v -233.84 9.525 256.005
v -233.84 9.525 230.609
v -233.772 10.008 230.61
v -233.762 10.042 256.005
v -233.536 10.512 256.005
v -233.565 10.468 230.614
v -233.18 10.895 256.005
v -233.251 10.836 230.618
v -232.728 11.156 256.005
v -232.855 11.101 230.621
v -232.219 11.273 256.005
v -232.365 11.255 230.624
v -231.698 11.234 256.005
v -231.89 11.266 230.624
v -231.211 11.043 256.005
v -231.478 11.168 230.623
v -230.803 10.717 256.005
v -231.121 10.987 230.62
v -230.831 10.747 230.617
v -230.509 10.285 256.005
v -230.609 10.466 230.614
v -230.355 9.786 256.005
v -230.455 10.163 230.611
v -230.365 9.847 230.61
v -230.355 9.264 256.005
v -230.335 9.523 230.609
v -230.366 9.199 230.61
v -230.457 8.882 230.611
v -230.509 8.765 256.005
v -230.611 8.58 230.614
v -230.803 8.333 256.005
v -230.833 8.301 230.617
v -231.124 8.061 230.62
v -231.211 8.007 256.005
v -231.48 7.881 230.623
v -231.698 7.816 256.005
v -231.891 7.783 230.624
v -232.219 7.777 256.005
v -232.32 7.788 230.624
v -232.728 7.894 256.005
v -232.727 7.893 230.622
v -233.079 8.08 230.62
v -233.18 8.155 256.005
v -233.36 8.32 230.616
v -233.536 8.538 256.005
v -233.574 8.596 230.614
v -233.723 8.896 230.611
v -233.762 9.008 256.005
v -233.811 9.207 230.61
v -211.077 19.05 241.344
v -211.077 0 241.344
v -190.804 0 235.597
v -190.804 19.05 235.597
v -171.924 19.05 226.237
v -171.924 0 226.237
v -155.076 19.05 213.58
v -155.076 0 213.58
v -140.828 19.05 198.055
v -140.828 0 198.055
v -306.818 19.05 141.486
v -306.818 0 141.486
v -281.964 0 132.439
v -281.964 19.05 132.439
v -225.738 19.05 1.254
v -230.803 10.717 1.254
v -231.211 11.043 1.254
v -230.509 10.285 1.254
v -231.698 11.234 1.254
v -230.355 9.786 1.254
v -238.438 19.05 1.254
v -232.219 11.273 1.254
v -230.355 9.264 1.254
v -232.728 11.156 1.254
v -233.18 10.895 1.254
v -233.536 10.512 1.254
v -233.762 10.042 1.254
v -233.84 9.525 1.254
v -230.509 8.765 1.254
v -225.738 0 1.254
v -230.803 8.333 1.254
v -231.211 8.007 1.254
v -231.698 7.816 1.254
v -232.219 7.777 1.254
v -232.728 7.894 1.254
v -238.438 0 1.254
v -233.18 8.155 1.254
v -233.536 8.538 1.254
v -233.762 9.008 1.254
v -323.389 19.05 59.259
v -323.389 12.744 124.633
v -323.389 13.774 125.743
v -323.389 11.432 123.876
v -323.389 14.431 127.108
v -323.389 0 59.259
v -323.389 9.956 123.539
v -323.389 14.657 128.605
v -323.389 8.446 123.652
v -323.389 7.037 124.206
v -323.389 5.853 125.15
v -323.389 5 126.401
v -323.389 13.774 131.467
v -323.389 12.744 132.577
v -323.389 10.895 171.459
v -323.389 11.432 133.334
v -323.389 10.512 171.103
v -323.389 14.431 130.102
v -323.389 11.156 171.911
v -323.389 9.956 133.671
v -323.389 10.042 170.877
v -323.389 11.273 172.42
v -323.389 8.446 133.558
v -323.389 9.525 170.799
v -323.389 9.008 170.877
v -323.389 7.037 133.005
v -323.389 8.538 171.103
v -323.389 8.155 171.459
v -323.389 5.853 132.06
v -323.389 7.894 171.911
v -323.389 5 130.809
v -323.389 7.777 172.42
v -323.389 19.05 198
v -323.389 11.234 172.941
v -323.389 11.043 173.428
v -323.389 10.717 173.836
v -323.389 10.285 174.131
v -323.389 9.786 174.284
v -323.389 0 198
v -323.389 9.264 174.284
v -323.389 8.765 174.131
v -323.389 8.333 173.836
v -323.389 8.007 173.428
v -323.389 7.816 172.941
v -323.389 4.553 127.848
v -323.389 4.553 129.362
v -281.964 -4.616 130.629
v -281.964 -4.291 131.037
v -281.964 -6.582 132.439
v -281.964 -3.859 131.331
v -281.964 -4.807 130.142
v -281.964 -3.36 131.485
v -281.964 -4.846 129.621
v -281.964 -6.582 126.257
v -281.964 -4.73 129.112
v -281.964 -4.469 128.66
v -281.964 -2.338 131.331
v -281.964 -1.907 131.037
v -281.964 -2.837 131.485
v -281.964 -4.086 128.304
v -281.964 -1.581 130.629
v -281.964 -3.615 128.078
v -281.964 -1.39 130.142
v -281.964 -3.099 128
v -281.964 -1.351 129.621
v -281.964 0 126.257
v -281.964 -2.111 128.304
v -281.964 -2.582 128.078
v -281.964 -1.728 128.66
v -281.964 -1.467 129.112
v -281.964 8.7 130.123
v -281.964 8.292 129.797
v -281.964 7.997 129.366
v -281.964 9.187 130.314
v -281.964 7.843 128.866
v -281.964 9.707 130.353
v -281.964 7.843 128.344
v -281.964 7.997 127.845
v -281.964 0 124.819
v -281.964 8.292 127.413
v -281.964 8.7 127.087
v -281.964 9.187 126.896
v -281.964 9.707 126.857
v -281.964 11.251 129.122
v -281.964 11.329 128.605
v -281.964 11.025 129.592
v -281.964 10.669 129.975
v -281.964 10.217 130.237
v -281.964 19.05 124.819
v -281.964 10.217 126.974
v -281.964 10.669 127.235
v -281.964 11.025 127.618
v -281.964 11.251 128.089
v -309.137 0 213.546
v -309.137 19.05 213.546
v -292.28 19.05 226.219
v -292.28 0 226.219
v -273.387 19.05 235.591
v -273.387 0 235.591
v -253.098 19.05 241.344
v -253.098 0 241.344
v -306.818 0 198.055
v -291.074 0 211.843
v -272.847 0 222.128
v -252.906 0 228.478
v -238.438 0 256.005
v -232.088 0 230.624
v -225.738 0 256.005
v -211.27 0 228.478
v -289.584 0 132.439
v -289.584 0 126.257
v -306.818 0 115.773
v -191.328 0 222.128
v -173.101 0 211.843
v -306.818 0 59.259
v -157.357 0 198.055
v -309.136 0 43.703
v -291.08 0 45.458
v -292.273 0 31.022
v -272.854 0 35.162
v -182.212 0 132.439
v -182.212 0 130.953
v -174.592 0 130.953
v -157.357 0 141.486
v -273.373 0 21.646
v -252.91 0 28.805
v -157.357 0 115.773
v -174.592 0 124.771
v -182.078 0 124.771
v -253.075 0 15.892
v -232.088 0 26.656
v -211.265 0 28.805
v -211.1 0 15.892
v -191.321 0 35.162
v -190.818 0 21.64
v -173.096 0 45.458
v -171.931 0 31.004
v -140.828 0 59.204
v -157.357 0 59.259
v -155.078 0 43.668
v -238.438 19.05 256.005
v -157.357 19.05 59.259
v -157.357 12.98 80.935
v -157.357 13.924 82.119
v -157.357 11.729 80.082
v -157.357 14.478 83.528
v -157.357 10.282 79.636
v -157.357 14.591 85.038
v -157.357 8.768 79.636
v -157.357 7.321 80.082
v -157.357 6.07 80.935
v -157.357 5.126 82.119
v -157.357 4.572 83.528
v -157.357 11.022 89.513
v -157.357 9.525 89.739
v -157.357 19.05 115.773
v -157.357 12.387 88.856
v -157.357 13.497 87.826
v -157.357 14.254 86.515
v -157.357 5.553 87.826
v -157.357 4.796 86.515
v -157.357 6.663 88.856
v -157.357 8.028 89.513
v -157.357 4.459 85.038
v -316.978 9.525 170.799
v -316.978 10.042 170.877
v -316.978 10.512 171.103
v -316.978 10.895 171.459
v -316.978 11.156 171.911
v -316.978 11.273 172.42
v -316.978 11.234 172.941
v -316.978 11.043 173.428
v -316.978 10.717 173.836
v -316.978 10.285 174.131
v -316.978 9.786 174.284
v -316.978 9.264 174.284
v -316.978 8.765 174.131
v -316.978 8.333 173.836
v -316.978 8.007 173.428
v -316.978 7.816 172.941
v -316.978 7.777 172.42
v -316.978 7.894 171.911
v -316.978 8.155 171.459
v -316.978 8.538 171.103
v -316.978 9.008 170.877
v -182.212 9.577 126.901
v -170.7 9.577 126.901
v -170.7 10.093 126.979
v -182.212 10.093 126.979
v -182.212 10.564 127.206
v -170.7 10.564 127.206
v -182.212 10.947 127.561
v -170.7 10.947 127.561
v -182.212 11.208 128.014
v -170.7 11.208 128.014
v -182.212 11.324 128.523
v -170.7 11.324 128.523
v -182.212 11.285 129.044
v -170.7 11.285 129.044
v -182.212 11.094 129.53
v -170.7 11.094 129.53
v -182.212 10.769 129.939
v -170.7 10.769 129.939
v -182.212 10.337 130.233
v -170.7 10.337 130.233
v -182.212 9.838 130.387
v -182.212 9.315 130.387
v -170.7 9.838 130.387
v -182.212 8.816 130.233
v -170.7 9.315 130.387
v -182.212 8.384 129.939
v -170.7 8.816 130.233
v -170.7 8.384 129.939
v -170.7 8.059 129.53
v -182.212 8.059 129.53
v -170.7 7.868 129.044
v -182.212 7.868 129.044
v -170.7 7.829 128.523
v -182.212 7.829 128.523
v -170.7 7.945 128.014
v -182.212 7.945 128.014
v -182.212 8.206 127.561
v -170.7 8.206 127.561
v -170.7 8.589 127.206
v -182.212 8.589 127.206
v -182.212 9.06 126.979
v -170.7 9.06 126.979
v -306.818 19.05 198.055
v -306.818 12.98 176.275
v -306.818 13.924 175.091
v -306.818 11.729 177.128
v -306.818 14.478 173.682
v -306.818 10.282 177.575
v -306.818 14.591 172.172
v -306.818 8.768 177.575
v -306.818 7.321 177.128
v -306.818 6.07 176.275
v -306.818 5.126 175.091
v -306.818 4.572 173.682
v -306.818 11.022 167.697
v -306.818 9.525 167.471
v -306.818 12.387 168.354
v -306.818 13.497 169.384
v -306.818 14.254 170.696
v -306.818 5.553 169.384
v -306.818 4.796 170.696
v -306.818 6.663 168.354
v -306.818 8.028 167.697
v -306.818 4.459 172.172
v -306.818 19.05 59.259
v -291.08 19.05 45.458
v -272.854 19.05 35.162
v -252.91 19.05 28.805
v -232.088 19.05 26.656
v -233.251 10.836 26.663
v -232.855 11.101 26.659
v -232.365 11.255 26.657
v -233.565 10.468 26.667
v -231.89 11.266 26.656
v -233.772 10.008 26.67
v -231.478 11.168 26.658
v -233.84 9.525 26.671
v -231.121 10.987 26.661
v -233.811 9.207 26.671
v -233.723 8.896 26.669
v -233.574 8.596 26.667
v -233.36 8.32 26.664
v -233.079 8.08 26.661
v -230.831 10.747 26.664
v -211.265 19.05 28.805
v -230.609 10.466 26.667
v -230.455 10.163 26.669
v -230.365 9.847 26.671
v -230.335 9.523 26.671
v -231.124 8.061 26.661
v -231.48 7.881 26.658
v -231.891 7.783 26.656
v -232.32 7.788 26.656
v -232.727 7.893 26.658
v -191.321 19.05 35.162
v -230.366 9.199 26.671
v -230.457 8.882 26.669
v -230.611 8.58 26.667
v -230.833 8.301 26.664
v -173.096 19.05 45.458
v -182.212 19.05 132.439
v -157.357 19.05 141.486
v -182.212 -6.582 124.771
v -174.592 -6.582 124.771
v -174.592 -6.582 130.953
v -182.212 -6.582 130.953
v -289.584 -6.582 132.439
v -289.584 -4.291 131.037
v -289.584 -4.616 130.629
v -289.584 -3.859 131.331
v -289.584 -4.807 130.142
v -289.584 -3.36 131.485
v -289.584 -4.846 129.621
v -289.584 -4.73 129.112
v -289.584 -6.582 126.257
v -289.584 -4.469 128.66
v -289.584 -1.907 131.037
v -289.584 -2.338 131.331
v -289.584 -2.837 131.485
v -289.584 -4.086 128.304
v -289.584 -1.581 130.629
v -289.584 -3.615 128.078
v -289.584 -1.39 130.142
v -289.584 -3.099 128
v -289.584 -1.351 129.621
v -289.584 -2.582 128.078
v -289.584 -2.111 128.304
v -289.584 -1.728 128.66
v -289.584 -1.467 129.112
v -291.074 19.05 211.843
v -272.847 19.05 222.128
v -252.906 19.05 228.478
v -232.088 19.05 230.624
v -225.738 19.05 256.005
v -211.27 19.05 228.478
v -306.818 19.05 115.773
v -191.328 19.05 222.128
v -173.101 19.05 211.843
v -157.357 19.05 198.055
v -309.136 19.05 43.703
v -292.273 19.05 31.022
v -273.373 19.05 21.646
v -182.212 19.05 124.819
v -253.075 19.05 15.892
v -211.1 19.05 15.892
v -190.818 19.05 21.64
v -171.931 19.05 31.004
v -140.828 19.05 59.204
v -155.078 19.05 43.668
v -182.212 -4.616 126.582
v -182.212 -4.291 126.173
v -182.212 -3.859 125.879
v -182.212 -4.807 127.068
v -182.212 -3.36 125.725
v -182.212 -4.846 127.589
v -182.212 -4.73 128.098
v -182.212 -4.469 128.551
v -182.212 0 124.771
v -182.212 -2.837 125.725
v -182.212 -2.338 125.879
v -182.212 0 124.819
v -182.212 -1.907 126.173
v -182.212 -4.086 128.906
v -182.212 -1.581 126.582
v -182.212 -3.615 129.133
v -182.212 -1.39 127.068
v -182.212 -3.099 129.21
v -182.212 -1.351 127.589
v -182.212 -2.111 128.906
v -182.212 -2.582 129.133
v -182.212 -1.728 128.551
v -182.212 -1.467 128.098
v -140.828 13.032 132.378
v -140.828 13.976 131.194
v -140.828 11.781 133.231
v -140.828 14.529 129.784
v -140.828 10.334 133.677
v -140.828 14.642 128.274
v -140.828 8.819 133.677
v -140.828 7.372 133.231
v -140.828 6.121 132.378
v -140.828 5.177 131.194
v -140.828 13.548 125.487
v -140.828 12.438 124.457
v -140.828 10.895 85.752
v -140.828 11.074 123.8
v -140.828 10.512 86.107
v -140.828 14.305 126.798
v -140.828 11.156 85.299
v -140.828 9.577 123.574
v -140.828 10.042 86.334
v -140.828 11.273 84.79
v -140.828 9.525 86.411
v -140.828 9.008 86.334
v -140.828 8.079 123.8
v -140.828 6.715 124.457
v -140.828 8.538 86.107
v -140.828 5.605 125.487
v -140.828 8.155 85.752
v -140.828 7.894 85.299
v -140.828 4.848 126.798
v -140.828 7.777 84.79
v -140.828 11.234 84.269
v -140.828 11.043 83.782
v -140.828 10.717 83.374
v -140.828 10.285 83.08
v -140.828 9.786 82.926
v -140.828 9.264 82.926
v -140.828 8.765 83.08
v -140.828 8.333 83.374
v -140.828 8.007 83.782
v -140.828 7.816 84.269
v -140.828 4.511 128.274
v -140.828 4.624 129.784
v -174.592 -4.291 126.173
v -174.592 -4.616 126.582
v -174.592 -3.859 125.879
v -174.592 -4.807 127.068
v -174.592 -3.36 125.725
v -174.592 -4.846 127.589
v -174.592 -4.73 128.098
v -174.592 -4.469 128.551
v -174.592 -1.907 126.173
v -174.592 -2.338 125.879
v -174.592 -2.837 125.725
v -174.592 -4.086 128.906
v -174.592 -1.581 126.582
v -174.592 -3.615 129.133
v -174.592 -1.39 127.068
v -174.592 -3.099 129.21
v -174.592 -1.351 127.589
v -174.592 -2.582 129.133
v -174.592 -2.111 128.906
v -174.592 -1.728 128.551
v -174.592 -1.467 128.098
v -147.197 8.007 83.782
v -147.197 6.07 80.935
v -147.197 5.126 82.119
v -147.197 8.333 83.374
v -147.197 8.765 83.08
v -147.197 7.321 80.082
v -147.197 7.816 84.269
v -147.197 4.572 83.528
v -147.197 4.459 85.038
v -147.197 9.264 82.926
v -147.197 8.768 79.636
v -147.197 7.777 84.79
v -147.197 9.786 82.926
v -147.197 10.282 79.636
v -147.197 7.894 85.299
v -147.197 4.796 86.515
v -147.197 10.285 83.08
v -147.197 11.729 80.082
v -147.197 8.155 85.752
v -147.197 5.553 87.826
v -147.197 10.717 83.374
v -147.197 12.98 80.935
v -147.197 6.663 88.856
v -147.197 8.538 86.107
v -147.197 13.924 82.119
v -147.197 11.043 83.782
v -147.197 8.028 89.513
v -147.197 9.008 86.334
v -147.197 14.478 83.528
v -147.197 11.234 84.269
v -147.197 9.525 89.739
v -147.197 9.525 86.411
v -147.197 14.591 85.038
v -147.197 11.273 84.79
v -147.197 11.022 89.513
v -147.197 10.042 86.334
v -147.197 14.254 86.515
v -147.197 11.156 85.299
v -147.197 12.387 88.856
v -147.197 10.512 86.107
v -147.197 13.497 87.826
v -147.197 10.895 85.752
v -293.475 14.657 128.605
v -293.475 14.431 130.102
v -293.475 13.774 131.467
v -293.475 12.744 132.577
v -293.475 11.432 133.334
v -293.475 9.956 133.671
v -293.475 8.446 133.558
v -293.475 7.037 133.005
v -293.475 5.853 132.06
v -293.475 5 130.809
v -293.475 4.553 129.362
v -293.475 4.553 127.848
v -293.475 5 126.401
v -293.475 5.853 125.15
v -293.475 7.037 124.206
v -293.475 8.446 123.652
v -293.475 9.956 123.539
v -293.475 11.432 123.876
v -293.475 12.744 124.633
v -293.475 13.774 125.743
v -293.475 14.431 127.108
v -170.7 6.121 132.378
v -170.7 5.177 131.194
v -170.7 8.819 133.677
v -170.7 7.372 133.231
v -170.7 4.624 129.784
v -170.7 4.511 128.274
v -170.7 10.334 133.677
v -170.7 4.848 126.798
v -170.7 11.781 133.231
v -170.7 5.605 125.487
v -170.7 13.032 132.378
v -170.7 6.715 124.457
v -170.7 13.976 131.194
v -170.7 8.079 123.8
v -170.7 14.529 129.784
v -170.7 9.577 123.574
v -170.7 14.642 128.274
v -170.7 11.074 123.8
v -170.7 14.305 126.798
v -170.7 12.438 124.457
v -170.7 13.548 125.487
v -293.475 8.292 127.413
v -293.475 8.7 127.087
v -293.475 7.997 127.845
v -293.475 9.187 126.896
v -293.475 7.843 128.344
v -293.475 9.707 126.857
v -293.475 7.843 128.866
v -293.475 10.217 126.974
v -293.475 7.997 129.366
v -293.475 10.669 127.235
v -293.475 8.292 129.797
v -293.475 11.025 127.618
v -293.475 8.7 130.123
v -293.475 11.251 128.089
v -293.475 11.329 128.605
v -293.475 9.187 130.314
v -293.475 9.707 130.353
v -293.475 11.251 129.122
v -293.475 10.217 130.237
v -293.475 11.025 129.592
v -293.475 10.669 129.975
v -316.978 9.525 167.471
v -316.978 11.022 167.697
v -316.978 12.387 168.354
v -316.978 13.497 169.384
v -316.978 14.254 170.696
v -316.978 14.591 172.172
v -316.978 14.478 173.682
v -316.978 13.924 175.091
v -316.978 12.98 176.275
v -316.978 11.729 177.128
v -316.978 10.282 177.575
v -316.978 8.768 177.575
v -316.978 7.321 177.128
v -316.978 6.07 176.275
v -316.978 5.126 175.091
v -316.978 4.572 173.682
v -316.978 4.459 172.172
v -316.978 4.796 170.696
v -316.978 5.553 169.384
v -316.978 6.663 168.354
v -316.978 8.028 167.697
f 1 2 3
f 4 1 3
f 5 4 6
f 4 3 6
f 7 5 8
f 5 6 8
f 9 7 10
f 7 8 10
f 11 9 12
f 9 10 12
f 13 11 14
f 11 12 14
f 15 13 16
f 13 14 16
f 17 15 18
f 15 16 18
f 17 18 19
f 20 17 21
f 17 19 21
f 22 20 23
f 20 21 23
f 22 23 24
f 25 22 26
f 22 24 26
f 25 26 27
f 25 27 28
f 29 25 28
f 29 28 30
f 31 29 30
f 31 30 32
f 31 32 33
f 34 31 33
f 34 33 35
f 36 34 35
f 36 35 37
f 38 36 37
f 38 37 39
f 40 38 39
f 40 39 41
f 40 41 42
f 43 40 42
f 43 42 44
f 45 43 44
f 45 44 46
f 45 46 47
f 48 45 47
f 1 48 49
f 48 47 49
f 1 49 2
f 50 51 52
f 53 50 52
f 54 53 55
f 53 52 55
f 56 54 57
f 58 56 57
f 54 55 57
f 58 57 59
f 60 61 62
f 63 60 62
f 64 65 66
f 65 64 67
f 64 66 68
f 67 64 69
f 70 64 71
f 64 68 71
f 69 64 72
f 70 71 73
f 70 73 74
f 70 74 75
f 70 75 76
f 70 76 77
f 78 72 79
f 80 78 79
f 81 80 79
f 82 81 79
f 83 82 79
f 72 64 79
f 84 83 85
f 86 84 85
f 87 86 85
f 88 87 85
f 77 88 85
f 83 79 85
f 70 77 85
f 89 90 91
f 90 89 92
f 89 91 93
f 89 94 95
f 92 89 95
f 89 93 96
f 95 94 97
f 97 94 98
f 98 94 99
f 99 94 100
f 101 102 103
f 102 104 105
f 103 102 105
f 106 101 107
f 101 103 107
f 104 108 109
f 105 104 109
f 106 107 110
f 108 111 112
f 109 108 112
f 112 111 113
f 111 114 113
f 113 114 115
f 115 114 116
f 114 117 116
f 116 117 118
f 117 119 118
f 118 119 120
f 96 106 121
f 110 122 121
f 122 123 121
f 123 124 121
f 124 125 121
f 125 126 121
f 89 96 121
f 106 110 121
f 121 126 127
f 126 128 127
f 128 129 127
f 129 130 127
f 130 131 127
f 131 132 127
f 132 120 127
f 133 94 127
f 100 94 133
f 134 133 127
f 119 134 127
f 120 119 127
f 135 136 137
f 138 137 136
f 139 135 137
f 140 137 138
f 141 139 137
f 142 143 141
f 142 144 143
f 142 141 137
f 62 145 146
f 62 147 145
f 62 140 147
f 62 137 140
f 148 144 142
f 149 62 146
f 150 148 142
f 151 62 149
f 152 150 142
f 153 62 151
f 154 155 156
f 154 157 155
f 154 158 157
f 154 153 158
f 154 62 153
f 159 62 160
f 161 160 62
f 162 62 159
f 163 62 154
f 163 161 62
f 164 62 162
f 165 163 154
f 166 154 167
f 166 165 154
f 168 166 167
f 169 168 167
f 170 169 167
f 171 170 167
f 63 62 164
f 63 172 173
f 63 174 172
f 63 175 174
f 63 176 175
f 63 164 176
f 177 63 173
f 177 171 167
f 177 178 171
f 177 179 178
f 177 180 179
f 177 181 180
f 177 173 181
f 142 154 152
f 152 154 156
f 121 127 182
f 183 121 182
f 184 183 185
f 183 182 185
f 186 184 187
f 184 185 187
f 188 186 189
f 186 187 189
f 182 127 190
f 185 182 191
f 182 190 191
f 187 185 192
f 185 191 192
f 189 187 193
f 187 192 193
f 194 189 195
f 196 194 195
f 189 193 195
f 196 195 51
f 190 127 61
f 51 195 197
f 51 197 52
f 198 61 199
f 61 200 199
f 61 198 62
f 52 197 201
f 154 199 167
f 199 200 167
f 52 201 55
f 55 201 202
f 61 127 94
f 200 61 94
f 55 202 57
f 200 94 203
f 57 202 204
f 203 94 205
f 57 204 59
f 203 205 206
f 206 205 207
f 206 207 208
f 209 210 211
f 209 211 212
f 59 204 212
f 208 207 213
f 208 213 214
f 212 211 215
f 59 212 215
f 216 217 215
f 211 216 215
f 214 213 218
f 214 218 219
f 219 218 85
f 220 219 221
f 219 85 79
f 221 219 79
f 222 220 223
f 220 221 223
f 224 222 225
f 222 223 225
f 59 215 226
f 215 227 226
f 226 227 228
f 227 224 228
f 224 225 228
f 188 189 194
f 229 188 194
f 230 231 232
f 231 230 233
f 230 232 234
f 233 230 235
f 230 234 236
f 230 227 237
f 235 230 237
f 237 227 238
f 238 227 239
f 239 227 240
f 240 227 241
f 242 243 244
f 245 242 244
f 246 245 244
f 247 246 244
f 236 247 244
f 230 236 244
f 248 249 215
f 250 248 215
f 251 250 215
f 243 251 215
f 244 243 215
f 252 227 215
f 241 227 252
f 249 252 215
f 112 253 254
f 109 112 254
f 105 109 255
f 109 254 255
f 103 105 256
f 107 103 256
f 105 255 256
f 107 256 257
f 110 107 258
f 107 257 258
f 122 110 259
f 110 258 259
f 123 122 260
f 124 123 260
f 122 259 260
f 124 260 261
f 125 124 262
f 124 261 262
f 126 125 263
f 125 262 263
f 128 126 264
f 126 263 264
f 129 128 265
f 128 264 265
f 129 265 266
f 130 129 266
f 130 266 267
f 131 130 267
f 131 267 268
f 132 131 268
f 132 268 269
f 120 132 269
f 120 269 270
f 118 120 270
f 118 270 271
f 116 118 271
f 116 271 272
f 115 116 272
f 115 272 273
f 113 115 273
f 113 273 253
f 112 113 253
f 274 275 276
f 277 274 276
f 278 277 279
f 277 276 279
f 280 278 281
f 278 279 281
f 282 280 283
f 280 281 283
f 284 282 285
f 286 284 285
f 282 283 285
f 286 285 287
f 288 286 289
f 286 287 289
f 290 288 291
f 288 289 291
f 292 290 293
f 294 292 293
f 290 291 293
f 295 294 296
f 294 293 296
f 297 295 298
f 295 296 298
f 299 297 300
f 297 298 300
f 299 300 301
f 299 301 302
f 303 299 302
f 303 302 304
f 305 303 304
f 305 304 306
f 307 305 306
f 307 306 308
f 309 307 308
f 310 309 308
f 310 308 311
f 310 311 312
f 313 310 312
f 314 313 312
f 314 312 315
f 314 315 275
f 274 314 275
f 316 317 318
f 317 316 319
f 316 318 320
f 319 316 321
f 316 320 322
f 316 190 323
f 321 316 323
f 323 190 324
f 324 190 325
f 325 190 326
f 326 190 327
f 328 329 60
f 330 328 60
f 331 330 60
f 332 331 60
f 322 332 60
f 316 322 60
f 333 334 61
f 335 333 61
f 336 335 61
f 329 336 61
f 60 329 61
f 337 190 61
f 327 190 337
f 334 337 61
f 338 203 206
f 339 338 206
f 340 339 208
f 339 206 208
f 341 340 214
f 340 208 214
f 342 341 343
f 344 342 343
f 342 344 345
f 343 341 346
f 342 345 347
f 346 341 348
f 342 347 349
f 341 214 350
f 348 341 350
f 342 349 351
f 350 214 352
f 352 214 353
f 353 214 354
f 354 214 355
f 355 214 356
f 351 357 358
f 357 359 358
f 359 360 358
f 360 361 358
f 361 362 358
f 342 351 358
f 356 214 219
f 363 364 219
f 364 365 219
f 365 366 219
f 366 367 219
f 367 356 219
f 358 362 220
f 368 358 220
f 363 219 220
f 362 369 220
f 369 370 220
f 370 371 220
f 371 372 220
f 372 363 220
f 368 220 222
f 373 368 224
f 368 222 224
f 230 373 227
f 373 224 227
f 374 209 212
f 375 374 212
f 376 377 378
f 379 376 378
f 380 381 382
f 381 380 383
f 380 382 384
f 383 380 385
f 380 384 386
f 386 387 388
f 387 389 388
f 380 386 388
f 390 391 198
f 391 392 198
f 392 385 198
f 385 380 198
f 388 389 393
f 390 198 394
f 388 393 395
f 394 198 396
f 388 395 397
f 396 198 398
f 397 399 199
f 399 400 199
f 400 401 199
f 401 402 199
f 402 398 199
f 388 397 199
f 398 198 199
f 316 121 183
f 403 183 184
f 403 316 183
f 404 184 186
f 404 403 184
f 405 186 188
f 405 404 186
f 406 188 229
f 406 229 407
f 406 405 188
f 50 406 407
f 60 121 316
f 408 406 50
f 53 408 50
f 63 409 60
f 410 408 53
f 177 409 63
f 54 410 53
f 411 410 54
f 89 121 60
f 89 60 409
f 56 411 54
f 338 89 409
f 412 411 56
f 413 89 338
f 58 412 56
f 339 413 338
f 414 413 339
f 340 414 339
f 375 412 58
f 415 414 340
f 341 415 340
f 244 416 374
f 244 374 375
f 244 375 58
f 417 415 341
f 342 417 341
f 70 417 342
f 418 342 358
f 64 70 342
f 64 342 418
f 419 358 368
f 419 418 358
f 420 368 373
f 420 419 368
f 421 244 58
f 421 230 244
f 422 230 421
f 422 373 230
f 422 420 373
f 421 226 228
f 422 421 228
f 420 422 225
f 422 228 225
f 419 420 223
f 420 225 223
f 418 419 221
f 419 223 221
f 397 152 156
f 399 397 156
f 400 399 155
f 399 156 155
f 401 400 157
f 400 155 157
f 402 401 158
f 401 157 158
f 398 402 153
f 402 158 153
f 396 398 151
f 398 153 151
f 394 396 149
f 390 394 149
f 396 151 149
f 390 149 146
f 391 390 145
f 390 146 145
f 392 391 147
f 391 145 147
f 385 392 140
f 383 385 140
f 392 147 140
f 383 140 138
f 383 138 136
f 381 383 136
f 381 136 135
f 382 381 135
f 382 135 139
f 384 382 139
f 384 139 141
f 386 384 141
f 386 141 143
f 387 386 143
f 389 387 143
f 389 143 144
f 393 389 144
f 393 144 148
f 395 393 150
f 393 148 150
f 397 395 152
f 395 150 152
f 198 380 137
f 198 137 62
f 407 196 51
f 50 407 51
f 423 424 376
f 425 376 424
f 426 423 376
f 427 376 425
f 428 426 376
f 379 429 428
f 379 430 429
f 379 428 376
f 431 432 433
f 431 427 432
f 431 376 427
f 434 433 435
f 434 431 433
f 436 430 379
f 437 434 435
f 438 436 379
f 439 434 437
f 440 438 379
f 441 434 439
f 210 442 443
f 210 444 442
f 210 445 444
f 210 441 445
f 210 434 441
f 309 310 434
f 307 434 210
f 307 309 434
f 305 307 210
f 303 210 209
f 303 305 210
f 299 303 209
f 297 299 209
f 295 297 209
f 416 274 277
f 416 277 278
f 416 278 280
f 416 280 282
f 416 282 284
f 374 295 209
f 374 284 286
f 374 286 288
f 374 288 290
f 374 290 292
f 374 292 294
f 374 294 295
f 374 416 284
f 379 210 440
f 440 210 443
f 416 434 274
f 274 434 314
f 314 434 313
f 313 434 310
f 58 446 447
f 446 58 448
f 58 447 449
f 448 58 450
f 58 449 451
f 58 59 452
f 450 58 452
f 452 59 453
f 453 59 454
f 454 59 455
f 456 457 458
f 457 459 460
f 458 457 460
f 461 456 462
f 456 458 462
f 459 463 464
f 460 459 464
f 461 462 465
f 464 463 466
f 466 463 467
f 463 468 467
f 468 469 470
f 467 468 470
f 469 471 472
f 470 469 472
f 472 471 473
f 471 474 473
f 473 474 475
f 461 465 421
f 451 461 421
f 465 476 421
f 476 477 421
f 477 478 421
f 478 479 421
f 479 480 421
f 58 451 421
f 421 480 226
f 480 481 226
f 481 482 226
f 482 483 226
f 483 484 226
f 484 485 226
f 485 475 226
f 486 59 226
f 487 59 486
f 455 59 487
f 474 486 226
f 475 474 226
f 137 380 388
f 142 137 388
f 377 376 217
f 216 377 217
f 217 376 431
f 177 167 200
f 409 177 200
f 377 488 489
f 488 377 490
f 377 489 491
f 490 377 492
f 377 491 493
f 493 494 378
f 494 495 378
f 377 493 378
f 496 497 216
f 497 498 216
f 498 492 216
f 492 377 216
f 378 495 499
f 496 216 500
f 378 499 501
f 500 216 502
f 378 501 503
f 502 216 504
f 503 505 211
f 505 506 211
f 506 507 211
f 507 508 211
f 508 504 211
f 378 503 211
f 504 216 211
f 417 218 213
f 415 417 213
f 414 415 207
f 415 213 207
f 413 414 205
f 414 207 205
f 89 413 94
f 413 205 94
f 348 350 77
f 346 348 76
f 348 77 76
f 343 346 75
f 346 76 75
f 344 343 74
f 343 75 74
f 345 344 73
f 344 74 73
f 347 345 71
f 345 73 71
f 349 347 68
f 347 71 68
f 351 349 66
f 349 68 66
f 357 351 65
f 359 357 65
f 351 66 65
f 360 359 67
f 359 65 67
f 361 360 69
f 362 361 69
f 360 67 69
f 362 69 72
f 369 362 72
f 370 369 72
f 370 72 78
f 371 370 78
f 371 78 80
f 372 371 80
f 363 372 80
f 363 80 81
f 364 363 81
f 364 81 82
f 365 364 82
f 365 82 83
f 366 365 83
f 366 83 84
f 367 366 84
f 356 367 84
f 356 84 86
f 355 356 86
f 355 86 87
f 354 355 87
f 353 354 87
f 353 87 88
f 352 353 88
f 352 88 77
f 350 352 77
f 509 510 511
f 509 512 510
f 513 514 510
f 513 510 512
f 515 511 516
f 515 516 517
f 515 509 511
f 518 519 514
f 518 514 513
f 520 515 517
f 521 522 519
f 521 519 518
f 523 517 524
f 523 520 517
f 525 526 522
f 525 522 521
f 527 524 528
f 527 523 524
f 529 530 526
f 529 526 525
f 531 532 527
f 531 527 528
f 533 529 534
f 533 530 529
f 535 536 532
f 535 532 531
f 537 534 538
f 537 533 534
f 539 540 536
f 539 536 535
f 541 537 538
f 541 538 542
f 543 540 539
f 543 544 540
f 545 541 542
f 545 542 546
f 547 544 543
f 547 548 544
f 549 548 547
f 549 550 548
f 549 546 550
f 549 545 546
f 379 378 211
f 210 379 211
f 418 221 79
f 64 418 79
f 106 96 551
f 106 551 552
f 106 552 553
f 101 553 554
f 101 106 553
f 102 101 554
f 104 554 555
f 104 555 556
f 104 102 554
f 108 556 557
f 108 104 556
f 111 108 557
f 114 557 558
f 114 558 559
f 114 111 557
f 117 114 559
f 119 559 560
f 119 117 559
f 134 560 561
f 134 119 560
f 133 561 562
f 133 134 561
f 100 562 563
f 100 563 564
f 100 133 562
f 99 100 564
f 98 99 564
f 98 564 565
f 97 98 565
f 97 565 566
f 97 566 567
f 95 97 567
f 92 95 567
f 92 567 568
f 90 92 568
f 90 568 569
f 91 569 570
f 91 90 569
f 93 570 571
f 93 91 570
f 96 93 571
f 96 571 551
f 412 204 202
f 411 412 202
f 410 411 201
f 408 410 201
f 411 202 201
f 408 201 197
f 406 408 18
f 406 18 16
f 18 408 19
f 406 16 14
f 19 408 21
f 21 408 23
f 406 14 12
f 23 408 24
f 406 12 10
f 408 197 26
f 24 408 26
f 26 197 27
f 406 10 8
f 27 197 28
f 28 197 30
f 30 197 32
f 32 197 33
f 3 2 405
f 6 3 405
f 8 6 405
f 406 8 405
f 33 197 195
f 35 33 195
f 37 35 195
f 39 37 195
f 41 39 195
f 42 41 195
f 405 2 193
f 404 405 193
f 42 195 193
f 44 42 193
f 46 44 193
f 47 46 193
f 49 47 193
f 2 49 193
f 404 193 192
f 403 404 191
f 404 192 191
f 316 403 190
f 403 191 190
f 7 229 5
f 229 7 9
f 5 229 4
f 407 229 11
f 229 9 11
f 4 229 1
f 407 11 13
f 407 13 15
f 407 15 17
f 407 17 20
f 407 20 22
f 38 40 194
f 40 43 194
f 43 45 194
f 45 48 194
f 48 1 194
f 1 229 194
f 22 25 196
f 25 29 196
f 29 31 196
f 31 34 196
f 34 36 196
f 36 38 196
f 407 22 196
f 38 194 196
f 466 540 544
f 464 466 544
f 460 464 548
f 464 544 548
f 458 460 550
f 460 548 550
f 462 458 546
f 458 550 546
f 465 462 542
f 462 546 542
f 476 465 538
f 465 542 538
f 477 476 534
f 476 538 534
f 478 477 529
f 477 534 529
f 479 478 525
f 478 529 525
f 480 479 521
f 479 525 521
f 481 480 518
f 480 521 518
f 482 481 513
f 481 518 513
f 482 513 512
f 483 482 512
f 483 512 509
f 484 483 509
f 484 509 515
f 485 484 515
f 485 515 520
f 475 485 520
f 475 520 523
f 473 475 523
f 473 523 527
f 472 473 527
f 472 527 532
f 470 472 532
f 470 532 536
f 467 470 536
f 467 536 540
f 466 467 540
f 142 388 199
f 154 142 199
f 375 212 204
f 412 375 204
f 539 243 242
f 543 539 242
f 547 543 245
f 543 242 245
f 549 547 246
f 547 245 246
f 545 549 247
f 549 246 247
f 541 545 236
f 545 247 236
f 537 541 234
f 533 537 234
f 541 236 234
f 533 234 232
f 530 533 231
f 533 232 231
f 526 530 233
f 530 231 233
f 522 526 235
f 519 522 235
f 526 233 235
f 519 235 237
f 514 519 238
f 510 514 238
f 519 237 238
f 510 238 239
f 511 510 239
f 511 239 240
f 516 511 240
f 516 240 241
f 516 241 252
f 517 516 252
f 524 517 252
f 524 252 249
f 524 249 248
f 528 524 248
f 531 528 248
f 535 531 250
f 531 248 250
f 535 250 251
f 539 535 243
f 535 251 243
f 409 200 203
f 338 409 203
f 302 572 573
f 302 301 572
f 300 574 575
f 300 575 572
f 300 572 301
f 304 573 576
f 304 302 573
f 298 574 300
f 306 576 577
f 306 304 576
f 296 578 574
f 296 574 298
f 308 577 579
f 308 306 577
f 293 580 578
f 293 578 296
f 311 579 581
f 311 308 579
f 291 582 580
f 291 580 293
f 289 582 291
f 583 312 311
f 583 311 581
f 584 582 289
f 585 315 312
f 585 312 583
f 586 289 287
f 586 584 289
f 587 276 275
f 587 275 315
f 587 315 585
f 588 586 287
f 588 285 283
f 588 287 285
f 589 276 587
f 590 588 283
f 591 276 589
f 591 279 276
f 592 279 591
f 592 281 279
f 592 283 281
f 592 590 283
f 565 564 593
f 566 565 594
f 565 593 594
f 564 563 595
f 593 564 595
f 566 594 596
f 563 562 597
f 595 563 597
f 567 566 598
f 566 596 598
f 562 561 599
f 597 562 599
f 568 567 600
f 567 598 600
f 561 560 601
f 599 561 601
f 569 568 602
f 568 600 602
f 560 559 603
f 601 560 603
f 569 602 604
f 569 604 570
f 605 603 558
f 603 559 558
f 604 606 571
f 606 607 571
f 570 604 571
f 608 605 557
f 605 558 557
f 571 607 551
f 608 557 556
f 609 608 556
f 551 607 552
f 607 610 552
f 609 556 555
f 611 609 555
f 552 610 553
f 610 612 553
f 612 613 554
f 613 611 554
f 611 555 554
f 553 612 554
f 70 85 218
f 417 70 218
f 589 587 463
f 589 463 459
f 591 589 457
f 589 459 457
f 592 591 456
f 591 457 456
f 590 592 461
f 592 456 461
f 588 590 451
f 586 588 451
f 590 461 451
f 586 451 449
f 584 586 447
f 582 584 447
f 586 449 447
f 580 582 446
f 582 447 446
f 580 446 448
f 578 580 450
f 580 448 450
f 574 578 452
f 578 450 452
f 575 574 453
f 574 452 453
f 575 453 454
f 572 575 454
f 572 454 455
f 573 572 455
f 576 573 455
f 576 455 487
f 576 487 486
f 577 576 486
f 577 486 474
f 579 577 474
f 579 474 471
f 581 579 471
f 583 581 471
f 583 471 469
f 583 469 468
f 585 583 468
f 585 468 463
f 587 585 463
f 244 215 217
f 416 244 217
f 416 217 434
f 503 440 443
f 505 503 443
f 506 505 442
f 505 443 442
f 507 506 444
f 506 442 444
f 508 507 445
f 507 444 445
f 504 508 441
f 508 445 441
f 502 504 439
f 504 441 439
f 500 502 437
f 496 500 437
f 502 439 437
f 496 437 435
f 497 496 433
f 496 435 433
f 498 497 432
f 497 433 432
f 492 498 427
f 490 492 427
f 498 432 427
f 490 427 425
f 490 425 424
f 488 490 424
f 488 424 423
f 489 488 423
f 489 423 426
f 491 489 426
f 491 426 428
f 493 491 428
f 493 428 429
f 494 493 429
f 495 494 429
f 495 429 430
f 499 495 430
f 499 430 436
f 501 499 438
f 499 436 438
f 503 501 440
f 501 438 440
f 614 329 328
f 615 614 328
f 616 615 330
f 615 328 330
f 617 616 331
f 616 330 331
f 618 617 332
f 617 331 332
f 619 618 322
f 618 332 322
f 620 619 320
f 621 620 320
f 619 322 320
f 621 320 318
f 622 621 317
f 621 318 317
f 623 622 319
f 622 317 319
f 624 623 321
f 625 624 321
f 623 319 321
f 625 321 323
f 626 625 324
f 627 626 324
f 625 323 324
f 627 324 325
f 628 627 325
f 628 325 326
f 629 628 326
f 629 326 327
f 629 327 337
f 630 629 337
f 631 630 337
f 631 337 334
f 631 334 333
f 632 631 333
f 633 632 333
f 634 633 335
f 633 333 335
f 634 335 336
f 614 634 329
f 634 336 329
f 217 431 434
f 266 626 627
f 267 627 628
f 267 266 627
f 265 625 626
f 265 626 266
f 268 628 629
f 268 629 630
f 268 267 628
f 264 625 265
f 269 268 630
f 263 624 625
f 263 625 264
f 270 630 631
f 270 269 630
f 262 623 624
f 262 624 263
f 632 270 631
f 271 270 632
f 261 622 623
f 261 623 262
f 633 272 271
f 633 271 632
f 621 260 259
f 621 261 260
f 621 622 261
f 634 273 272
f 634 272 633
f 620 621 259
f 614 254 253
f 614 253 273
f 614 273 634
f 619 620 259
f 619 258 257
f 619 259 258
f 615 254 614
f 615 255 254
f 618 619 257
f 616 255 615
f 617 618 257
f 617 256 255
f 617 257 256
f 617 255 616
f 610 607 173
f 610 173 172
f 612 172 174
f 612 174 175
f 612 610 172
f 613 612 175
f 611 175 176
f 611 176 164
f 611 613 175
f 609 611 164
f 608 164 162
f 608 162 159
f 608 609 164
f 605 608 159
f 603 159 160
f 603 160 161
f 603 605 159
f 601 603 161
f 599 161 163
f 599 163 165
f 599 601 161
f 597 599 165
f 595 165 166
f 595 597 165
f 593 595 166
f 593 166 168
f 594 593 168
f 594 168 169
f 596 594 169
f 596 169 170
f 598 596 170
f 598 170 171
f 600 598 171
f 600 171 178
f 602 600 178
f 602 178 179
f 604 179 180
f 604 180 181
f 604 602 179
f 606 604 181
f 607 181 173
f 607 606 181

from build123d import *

# Parameters (mm, degrees)
BOSS_EXTRUDE1_DEPTH     = 19.05
SKETCH2_R               = 1.7526
CUT_EXTRUDE1_DEPTH      = 221.7
SKETCH3_R               = 5.08
CUT_EXTRUDE2_DEPTH      = 170.7
CIRPATTERN1_START       = -323.388650449
CIRPATTERN1_OUTLINE_R   = 5.08
CIRPATTERN1_DEPTH       = 29.913478247
CIRPATTERN1_START_2     = -293.475172202
CIRPATTERN1_2_OUTLINE_R = 1.7526
CIRPATTERN1_2_DEPTH     = 11.511586101
SKETCH5_R               = 1.7526
CUT_EXTRUDE3_DEPTH      = 295.91
SKETCH6_R               = 1.7526
CUT_EXTRUDE4_DEPTH      = 20.574
SKETCH7_R               = 5.08
CUT_EXTRUDE5_DEPTH      = 10.16
CIRPATTERN2_COUNT       = 2
SKETCH8_W               = 6.182053834
SKETCH8_H               = 6.581850062
SKETCH8_R               = 1.7526
BOSS_EXTRUDE2_DEPTH     = 7.62
CIRPATTERN3_COUNT       = 2


# Read off the part's stored shape, not the designer's step: CirPattern1
with BuildPart() as part:
    # Sketch1 → Boss-Extrude1 (new body)
    with BuildSketch(Plane(origin=(0, 0, 0), x_dir=(1, 0, 0), z_dir=(0, 1, 0))):
        with BuildLine():
            Line((-238.437586101, -1.254416157), (-253.074790503, -15.891620559))
            ThreePointArc((-253.074790503, -15.891620559), (-292.273480014, -31.022056532), (-323.388650449, -59.258797155))
            Line((-323.388650449, -59.258797155), (-323.388650449, -198.000222119))
            ThreePointArc((-323.388650449, -198.000222119), (-292.280058459, -226.218805317), (-253.09778688, -241.344364055))
            Line((-253.09778688, -241.344364055), (-253.074790503, -241.367360432))
            Line((-253.074790503, -241.367360432), (-238.437586101, -256.004564834))
            Line((-238.437586101, -256.004564834), (-225.737586101, -256.004564834))
            Line((-225.737586101, -256.004564834), (-211.100381699, -241.367360432))
            Line((-211.100381699, -241.367360432), (-211.077385322, -241.344364055))
            ThreePointArc((-211.077385322, -241.344364055), (-171.924255518, -226.236769292), (-140.827968899, -198.054719126))
            Line((-140.827968899, -198.054719126), (-140.827968899, -59.204261865))
            ThreePointArc((-140.827968899, -59.204261865), (-171.930845296, -31.004081905), (-211.100381699, -15.891620559))
            Line((-211.100381699, -15.891620559), (-225.737586101, -1.254416157))
            Line((-225.737586101, -1.254416157), (-238.437586101, -1.254416157))
        make_face()
        with BuildLine():
            Line((-281.963586101, -124.819490495), (-306.818249022, -115.773133009))
            Line((-306.818249022, -115.773133009), (-306.818249022, -59.258790155))
            ThreePointArc((-306.818249022, -59.258790155), (-232.087586101, -26.656188726), (-157.356923179, -59.258790155))
            Line((-157.356923179, -59.258790155), (-157.356923179, -115.773133009))
            Line((-157.356923179, -115.773133009), (-182.211586101, -124.819490495))
            Line((-182.211586101, -124.819490495), (-182.211586101, -132.439490495))
            Line((-182.211586101, -132.439490495), (-157.356923179, -141.485847982))
            Line((-157.356923179, -141.485847982), (-157.356923179, -198.054719126))
            ThreePointArc((-157.356923179, -198.054719126), (-232.087586101, -230.624332183), (-306.818249022, -198.054719126))
            Line((-306.818249022, -198.054719126), (-306.818249022, -141.485847982))
            Line((-306.818249022, -141.485847982), (-281.963586101, -132.439490495))
            Line((-281.963586101, -132.439490495), (-281.963586101, -124.819490495))
        make_face(mode=Mode.SUBTRACT)
    extrude(amount=BOSS_EXTRUDE1_DEPTH)

    # Sketch2 → Cut-Extrude1 (cut)
    with BuildSketch(Plane(origin=(0, 0, 0), x_dir=(0, 0, -1), z_dir=(1, 0, 0))):
        with Locations((-128.653847867, 9.576501184)):
            Circle(SKETCH2_R)
    extrude(amount=-CUT_EXTRUDE1_DEPTH, mode=Mode.SUBTRACT)

    # Sketch3 → Cut-Extrude2 (cut)
    with BuildSketch(Plane(origin=(0, 0, 0), x_dir=(0, 0, -1), z_dir=(1, 0, 0))):
        with Locations((-128.653847867, 9.576501184)):
            Circle(SKETCH3_R)
    extrude(amount=-CUT_EXTRUDE2_DEPTH, mode=Mode.SUBTRACT)

    # CirPattern1 outline → CirPattern1 (cut)
    with BuildSketch(Plane.YZ.offset(CIRPATTERN1_START)):
        with Locations((9.576501184, 128.605133124)):
            Circle(CIRPATTERN1_OUTLINE_R)
    extrude(amount=CIRPATTERN1_DEPTH, mode=Mode.SUBTRACT)

    # CirPattern1 2 outline → CirPattern1 2 (cut)
    with BuildSketch(Plane.YZ.offset(CIRPATTERN1_START_2)):
        with Locations((9.576501184, 128.605133124)):
            Circle(CIRPATTERN1_2_OUTLINE_R)
    extrude(amount=CIRPATTERN1_2_DEPTH, mode=Mode.SUBTRACT)

    # Sketch5 → Cut-Extrude3 (cut)
    with BuildSketch(Plane(origin=(0, 0, 1.254416157), x_dir=(-1, 0, 0), z_dir=(0, 0, -1))):
        with Locations((232.087586101, 9.525)):
            Circle(SKETCH5_R)
    extrude(amount=-CUT_EXTRUDE3_DEPTH, mode=Mode.SUBTRACT)

    # Sketch6 → Cut-Extrude4 (cut)
    with BuildSketch(Plane.ZY.offset(157.356923179)):
        with Locations((84.658797155, 9.525)):
            Circle(SKETCH6_R)
    cut_extrude4 = extrude(amount=-CUT_EXTRUDE4_DEPTH, mode=Mode.SUBTRACT)

    # Sketch7 → Cut-Extrude5 (cut)
    with BuildSketch(Plane.ZY.offset(157.356923179)):
        with Locations((84.658797155, 9.525)):
            Circle(SKETCH7_R)
    cut_extrude5 = extrude(amount=-CUT_EXTRUDE5_DEPTH, mode=Mode.SUBTRACT)

    # CirPattern2: Cut-Extrude4, Cut-Extrude5 ×2 about axis
    cirpattern2_axis = Axis((-232.087586101, 0, 128.605133124), (0, -1, 0))
    add([cut_extrude4.rotate(cirpattern2_axis, i * 360 / CIRPATTERN2_COUNT) for i in range(1, CIRPATTERN2_COUNT)], mode=Mode.SUBTRACT)
    add([cut_extrude5.rotate(cirpattern2_axis, i * 360 / CIRPATTERN2_COUNT) for i in range(1, CIRPATTERN2_COUNT)], mode=Mode.SUBTRACT)

    # Sketch8 → Boss-Extrude2 (add)
    with BuildSketch(Plane(origin=(-281.963586101, 0, 0), x_dir=(0, 0, -1), z_dir=(1, 0, 0))):
        with Locations((-129.348463578, -3.290925031)):
            Rectangle(SKETCH8_W, SKETCH8_H)
        with Locations((-129.752447072, -3.098573281)):
            Circle(SKETCH8_R, mode=Mode.SUBTRACT)
    boss_extrude2 = extrude(amount=-BOSS_EXTRUDE2_DEPTH)

    # CirPattern3: Boss-Extrude2 ×2 about axis
    cirpattern3_axis = Axis((-232.087586101, 0, 128.605133124), (0, 1, 0))
    for i in range(1, CIRPATTERN3_COUNT):
        add(boss_extrude2.rotate(cirpattern3_axis, i * 360 / CIRPATTERN3_COUNT))


solid = part.part
